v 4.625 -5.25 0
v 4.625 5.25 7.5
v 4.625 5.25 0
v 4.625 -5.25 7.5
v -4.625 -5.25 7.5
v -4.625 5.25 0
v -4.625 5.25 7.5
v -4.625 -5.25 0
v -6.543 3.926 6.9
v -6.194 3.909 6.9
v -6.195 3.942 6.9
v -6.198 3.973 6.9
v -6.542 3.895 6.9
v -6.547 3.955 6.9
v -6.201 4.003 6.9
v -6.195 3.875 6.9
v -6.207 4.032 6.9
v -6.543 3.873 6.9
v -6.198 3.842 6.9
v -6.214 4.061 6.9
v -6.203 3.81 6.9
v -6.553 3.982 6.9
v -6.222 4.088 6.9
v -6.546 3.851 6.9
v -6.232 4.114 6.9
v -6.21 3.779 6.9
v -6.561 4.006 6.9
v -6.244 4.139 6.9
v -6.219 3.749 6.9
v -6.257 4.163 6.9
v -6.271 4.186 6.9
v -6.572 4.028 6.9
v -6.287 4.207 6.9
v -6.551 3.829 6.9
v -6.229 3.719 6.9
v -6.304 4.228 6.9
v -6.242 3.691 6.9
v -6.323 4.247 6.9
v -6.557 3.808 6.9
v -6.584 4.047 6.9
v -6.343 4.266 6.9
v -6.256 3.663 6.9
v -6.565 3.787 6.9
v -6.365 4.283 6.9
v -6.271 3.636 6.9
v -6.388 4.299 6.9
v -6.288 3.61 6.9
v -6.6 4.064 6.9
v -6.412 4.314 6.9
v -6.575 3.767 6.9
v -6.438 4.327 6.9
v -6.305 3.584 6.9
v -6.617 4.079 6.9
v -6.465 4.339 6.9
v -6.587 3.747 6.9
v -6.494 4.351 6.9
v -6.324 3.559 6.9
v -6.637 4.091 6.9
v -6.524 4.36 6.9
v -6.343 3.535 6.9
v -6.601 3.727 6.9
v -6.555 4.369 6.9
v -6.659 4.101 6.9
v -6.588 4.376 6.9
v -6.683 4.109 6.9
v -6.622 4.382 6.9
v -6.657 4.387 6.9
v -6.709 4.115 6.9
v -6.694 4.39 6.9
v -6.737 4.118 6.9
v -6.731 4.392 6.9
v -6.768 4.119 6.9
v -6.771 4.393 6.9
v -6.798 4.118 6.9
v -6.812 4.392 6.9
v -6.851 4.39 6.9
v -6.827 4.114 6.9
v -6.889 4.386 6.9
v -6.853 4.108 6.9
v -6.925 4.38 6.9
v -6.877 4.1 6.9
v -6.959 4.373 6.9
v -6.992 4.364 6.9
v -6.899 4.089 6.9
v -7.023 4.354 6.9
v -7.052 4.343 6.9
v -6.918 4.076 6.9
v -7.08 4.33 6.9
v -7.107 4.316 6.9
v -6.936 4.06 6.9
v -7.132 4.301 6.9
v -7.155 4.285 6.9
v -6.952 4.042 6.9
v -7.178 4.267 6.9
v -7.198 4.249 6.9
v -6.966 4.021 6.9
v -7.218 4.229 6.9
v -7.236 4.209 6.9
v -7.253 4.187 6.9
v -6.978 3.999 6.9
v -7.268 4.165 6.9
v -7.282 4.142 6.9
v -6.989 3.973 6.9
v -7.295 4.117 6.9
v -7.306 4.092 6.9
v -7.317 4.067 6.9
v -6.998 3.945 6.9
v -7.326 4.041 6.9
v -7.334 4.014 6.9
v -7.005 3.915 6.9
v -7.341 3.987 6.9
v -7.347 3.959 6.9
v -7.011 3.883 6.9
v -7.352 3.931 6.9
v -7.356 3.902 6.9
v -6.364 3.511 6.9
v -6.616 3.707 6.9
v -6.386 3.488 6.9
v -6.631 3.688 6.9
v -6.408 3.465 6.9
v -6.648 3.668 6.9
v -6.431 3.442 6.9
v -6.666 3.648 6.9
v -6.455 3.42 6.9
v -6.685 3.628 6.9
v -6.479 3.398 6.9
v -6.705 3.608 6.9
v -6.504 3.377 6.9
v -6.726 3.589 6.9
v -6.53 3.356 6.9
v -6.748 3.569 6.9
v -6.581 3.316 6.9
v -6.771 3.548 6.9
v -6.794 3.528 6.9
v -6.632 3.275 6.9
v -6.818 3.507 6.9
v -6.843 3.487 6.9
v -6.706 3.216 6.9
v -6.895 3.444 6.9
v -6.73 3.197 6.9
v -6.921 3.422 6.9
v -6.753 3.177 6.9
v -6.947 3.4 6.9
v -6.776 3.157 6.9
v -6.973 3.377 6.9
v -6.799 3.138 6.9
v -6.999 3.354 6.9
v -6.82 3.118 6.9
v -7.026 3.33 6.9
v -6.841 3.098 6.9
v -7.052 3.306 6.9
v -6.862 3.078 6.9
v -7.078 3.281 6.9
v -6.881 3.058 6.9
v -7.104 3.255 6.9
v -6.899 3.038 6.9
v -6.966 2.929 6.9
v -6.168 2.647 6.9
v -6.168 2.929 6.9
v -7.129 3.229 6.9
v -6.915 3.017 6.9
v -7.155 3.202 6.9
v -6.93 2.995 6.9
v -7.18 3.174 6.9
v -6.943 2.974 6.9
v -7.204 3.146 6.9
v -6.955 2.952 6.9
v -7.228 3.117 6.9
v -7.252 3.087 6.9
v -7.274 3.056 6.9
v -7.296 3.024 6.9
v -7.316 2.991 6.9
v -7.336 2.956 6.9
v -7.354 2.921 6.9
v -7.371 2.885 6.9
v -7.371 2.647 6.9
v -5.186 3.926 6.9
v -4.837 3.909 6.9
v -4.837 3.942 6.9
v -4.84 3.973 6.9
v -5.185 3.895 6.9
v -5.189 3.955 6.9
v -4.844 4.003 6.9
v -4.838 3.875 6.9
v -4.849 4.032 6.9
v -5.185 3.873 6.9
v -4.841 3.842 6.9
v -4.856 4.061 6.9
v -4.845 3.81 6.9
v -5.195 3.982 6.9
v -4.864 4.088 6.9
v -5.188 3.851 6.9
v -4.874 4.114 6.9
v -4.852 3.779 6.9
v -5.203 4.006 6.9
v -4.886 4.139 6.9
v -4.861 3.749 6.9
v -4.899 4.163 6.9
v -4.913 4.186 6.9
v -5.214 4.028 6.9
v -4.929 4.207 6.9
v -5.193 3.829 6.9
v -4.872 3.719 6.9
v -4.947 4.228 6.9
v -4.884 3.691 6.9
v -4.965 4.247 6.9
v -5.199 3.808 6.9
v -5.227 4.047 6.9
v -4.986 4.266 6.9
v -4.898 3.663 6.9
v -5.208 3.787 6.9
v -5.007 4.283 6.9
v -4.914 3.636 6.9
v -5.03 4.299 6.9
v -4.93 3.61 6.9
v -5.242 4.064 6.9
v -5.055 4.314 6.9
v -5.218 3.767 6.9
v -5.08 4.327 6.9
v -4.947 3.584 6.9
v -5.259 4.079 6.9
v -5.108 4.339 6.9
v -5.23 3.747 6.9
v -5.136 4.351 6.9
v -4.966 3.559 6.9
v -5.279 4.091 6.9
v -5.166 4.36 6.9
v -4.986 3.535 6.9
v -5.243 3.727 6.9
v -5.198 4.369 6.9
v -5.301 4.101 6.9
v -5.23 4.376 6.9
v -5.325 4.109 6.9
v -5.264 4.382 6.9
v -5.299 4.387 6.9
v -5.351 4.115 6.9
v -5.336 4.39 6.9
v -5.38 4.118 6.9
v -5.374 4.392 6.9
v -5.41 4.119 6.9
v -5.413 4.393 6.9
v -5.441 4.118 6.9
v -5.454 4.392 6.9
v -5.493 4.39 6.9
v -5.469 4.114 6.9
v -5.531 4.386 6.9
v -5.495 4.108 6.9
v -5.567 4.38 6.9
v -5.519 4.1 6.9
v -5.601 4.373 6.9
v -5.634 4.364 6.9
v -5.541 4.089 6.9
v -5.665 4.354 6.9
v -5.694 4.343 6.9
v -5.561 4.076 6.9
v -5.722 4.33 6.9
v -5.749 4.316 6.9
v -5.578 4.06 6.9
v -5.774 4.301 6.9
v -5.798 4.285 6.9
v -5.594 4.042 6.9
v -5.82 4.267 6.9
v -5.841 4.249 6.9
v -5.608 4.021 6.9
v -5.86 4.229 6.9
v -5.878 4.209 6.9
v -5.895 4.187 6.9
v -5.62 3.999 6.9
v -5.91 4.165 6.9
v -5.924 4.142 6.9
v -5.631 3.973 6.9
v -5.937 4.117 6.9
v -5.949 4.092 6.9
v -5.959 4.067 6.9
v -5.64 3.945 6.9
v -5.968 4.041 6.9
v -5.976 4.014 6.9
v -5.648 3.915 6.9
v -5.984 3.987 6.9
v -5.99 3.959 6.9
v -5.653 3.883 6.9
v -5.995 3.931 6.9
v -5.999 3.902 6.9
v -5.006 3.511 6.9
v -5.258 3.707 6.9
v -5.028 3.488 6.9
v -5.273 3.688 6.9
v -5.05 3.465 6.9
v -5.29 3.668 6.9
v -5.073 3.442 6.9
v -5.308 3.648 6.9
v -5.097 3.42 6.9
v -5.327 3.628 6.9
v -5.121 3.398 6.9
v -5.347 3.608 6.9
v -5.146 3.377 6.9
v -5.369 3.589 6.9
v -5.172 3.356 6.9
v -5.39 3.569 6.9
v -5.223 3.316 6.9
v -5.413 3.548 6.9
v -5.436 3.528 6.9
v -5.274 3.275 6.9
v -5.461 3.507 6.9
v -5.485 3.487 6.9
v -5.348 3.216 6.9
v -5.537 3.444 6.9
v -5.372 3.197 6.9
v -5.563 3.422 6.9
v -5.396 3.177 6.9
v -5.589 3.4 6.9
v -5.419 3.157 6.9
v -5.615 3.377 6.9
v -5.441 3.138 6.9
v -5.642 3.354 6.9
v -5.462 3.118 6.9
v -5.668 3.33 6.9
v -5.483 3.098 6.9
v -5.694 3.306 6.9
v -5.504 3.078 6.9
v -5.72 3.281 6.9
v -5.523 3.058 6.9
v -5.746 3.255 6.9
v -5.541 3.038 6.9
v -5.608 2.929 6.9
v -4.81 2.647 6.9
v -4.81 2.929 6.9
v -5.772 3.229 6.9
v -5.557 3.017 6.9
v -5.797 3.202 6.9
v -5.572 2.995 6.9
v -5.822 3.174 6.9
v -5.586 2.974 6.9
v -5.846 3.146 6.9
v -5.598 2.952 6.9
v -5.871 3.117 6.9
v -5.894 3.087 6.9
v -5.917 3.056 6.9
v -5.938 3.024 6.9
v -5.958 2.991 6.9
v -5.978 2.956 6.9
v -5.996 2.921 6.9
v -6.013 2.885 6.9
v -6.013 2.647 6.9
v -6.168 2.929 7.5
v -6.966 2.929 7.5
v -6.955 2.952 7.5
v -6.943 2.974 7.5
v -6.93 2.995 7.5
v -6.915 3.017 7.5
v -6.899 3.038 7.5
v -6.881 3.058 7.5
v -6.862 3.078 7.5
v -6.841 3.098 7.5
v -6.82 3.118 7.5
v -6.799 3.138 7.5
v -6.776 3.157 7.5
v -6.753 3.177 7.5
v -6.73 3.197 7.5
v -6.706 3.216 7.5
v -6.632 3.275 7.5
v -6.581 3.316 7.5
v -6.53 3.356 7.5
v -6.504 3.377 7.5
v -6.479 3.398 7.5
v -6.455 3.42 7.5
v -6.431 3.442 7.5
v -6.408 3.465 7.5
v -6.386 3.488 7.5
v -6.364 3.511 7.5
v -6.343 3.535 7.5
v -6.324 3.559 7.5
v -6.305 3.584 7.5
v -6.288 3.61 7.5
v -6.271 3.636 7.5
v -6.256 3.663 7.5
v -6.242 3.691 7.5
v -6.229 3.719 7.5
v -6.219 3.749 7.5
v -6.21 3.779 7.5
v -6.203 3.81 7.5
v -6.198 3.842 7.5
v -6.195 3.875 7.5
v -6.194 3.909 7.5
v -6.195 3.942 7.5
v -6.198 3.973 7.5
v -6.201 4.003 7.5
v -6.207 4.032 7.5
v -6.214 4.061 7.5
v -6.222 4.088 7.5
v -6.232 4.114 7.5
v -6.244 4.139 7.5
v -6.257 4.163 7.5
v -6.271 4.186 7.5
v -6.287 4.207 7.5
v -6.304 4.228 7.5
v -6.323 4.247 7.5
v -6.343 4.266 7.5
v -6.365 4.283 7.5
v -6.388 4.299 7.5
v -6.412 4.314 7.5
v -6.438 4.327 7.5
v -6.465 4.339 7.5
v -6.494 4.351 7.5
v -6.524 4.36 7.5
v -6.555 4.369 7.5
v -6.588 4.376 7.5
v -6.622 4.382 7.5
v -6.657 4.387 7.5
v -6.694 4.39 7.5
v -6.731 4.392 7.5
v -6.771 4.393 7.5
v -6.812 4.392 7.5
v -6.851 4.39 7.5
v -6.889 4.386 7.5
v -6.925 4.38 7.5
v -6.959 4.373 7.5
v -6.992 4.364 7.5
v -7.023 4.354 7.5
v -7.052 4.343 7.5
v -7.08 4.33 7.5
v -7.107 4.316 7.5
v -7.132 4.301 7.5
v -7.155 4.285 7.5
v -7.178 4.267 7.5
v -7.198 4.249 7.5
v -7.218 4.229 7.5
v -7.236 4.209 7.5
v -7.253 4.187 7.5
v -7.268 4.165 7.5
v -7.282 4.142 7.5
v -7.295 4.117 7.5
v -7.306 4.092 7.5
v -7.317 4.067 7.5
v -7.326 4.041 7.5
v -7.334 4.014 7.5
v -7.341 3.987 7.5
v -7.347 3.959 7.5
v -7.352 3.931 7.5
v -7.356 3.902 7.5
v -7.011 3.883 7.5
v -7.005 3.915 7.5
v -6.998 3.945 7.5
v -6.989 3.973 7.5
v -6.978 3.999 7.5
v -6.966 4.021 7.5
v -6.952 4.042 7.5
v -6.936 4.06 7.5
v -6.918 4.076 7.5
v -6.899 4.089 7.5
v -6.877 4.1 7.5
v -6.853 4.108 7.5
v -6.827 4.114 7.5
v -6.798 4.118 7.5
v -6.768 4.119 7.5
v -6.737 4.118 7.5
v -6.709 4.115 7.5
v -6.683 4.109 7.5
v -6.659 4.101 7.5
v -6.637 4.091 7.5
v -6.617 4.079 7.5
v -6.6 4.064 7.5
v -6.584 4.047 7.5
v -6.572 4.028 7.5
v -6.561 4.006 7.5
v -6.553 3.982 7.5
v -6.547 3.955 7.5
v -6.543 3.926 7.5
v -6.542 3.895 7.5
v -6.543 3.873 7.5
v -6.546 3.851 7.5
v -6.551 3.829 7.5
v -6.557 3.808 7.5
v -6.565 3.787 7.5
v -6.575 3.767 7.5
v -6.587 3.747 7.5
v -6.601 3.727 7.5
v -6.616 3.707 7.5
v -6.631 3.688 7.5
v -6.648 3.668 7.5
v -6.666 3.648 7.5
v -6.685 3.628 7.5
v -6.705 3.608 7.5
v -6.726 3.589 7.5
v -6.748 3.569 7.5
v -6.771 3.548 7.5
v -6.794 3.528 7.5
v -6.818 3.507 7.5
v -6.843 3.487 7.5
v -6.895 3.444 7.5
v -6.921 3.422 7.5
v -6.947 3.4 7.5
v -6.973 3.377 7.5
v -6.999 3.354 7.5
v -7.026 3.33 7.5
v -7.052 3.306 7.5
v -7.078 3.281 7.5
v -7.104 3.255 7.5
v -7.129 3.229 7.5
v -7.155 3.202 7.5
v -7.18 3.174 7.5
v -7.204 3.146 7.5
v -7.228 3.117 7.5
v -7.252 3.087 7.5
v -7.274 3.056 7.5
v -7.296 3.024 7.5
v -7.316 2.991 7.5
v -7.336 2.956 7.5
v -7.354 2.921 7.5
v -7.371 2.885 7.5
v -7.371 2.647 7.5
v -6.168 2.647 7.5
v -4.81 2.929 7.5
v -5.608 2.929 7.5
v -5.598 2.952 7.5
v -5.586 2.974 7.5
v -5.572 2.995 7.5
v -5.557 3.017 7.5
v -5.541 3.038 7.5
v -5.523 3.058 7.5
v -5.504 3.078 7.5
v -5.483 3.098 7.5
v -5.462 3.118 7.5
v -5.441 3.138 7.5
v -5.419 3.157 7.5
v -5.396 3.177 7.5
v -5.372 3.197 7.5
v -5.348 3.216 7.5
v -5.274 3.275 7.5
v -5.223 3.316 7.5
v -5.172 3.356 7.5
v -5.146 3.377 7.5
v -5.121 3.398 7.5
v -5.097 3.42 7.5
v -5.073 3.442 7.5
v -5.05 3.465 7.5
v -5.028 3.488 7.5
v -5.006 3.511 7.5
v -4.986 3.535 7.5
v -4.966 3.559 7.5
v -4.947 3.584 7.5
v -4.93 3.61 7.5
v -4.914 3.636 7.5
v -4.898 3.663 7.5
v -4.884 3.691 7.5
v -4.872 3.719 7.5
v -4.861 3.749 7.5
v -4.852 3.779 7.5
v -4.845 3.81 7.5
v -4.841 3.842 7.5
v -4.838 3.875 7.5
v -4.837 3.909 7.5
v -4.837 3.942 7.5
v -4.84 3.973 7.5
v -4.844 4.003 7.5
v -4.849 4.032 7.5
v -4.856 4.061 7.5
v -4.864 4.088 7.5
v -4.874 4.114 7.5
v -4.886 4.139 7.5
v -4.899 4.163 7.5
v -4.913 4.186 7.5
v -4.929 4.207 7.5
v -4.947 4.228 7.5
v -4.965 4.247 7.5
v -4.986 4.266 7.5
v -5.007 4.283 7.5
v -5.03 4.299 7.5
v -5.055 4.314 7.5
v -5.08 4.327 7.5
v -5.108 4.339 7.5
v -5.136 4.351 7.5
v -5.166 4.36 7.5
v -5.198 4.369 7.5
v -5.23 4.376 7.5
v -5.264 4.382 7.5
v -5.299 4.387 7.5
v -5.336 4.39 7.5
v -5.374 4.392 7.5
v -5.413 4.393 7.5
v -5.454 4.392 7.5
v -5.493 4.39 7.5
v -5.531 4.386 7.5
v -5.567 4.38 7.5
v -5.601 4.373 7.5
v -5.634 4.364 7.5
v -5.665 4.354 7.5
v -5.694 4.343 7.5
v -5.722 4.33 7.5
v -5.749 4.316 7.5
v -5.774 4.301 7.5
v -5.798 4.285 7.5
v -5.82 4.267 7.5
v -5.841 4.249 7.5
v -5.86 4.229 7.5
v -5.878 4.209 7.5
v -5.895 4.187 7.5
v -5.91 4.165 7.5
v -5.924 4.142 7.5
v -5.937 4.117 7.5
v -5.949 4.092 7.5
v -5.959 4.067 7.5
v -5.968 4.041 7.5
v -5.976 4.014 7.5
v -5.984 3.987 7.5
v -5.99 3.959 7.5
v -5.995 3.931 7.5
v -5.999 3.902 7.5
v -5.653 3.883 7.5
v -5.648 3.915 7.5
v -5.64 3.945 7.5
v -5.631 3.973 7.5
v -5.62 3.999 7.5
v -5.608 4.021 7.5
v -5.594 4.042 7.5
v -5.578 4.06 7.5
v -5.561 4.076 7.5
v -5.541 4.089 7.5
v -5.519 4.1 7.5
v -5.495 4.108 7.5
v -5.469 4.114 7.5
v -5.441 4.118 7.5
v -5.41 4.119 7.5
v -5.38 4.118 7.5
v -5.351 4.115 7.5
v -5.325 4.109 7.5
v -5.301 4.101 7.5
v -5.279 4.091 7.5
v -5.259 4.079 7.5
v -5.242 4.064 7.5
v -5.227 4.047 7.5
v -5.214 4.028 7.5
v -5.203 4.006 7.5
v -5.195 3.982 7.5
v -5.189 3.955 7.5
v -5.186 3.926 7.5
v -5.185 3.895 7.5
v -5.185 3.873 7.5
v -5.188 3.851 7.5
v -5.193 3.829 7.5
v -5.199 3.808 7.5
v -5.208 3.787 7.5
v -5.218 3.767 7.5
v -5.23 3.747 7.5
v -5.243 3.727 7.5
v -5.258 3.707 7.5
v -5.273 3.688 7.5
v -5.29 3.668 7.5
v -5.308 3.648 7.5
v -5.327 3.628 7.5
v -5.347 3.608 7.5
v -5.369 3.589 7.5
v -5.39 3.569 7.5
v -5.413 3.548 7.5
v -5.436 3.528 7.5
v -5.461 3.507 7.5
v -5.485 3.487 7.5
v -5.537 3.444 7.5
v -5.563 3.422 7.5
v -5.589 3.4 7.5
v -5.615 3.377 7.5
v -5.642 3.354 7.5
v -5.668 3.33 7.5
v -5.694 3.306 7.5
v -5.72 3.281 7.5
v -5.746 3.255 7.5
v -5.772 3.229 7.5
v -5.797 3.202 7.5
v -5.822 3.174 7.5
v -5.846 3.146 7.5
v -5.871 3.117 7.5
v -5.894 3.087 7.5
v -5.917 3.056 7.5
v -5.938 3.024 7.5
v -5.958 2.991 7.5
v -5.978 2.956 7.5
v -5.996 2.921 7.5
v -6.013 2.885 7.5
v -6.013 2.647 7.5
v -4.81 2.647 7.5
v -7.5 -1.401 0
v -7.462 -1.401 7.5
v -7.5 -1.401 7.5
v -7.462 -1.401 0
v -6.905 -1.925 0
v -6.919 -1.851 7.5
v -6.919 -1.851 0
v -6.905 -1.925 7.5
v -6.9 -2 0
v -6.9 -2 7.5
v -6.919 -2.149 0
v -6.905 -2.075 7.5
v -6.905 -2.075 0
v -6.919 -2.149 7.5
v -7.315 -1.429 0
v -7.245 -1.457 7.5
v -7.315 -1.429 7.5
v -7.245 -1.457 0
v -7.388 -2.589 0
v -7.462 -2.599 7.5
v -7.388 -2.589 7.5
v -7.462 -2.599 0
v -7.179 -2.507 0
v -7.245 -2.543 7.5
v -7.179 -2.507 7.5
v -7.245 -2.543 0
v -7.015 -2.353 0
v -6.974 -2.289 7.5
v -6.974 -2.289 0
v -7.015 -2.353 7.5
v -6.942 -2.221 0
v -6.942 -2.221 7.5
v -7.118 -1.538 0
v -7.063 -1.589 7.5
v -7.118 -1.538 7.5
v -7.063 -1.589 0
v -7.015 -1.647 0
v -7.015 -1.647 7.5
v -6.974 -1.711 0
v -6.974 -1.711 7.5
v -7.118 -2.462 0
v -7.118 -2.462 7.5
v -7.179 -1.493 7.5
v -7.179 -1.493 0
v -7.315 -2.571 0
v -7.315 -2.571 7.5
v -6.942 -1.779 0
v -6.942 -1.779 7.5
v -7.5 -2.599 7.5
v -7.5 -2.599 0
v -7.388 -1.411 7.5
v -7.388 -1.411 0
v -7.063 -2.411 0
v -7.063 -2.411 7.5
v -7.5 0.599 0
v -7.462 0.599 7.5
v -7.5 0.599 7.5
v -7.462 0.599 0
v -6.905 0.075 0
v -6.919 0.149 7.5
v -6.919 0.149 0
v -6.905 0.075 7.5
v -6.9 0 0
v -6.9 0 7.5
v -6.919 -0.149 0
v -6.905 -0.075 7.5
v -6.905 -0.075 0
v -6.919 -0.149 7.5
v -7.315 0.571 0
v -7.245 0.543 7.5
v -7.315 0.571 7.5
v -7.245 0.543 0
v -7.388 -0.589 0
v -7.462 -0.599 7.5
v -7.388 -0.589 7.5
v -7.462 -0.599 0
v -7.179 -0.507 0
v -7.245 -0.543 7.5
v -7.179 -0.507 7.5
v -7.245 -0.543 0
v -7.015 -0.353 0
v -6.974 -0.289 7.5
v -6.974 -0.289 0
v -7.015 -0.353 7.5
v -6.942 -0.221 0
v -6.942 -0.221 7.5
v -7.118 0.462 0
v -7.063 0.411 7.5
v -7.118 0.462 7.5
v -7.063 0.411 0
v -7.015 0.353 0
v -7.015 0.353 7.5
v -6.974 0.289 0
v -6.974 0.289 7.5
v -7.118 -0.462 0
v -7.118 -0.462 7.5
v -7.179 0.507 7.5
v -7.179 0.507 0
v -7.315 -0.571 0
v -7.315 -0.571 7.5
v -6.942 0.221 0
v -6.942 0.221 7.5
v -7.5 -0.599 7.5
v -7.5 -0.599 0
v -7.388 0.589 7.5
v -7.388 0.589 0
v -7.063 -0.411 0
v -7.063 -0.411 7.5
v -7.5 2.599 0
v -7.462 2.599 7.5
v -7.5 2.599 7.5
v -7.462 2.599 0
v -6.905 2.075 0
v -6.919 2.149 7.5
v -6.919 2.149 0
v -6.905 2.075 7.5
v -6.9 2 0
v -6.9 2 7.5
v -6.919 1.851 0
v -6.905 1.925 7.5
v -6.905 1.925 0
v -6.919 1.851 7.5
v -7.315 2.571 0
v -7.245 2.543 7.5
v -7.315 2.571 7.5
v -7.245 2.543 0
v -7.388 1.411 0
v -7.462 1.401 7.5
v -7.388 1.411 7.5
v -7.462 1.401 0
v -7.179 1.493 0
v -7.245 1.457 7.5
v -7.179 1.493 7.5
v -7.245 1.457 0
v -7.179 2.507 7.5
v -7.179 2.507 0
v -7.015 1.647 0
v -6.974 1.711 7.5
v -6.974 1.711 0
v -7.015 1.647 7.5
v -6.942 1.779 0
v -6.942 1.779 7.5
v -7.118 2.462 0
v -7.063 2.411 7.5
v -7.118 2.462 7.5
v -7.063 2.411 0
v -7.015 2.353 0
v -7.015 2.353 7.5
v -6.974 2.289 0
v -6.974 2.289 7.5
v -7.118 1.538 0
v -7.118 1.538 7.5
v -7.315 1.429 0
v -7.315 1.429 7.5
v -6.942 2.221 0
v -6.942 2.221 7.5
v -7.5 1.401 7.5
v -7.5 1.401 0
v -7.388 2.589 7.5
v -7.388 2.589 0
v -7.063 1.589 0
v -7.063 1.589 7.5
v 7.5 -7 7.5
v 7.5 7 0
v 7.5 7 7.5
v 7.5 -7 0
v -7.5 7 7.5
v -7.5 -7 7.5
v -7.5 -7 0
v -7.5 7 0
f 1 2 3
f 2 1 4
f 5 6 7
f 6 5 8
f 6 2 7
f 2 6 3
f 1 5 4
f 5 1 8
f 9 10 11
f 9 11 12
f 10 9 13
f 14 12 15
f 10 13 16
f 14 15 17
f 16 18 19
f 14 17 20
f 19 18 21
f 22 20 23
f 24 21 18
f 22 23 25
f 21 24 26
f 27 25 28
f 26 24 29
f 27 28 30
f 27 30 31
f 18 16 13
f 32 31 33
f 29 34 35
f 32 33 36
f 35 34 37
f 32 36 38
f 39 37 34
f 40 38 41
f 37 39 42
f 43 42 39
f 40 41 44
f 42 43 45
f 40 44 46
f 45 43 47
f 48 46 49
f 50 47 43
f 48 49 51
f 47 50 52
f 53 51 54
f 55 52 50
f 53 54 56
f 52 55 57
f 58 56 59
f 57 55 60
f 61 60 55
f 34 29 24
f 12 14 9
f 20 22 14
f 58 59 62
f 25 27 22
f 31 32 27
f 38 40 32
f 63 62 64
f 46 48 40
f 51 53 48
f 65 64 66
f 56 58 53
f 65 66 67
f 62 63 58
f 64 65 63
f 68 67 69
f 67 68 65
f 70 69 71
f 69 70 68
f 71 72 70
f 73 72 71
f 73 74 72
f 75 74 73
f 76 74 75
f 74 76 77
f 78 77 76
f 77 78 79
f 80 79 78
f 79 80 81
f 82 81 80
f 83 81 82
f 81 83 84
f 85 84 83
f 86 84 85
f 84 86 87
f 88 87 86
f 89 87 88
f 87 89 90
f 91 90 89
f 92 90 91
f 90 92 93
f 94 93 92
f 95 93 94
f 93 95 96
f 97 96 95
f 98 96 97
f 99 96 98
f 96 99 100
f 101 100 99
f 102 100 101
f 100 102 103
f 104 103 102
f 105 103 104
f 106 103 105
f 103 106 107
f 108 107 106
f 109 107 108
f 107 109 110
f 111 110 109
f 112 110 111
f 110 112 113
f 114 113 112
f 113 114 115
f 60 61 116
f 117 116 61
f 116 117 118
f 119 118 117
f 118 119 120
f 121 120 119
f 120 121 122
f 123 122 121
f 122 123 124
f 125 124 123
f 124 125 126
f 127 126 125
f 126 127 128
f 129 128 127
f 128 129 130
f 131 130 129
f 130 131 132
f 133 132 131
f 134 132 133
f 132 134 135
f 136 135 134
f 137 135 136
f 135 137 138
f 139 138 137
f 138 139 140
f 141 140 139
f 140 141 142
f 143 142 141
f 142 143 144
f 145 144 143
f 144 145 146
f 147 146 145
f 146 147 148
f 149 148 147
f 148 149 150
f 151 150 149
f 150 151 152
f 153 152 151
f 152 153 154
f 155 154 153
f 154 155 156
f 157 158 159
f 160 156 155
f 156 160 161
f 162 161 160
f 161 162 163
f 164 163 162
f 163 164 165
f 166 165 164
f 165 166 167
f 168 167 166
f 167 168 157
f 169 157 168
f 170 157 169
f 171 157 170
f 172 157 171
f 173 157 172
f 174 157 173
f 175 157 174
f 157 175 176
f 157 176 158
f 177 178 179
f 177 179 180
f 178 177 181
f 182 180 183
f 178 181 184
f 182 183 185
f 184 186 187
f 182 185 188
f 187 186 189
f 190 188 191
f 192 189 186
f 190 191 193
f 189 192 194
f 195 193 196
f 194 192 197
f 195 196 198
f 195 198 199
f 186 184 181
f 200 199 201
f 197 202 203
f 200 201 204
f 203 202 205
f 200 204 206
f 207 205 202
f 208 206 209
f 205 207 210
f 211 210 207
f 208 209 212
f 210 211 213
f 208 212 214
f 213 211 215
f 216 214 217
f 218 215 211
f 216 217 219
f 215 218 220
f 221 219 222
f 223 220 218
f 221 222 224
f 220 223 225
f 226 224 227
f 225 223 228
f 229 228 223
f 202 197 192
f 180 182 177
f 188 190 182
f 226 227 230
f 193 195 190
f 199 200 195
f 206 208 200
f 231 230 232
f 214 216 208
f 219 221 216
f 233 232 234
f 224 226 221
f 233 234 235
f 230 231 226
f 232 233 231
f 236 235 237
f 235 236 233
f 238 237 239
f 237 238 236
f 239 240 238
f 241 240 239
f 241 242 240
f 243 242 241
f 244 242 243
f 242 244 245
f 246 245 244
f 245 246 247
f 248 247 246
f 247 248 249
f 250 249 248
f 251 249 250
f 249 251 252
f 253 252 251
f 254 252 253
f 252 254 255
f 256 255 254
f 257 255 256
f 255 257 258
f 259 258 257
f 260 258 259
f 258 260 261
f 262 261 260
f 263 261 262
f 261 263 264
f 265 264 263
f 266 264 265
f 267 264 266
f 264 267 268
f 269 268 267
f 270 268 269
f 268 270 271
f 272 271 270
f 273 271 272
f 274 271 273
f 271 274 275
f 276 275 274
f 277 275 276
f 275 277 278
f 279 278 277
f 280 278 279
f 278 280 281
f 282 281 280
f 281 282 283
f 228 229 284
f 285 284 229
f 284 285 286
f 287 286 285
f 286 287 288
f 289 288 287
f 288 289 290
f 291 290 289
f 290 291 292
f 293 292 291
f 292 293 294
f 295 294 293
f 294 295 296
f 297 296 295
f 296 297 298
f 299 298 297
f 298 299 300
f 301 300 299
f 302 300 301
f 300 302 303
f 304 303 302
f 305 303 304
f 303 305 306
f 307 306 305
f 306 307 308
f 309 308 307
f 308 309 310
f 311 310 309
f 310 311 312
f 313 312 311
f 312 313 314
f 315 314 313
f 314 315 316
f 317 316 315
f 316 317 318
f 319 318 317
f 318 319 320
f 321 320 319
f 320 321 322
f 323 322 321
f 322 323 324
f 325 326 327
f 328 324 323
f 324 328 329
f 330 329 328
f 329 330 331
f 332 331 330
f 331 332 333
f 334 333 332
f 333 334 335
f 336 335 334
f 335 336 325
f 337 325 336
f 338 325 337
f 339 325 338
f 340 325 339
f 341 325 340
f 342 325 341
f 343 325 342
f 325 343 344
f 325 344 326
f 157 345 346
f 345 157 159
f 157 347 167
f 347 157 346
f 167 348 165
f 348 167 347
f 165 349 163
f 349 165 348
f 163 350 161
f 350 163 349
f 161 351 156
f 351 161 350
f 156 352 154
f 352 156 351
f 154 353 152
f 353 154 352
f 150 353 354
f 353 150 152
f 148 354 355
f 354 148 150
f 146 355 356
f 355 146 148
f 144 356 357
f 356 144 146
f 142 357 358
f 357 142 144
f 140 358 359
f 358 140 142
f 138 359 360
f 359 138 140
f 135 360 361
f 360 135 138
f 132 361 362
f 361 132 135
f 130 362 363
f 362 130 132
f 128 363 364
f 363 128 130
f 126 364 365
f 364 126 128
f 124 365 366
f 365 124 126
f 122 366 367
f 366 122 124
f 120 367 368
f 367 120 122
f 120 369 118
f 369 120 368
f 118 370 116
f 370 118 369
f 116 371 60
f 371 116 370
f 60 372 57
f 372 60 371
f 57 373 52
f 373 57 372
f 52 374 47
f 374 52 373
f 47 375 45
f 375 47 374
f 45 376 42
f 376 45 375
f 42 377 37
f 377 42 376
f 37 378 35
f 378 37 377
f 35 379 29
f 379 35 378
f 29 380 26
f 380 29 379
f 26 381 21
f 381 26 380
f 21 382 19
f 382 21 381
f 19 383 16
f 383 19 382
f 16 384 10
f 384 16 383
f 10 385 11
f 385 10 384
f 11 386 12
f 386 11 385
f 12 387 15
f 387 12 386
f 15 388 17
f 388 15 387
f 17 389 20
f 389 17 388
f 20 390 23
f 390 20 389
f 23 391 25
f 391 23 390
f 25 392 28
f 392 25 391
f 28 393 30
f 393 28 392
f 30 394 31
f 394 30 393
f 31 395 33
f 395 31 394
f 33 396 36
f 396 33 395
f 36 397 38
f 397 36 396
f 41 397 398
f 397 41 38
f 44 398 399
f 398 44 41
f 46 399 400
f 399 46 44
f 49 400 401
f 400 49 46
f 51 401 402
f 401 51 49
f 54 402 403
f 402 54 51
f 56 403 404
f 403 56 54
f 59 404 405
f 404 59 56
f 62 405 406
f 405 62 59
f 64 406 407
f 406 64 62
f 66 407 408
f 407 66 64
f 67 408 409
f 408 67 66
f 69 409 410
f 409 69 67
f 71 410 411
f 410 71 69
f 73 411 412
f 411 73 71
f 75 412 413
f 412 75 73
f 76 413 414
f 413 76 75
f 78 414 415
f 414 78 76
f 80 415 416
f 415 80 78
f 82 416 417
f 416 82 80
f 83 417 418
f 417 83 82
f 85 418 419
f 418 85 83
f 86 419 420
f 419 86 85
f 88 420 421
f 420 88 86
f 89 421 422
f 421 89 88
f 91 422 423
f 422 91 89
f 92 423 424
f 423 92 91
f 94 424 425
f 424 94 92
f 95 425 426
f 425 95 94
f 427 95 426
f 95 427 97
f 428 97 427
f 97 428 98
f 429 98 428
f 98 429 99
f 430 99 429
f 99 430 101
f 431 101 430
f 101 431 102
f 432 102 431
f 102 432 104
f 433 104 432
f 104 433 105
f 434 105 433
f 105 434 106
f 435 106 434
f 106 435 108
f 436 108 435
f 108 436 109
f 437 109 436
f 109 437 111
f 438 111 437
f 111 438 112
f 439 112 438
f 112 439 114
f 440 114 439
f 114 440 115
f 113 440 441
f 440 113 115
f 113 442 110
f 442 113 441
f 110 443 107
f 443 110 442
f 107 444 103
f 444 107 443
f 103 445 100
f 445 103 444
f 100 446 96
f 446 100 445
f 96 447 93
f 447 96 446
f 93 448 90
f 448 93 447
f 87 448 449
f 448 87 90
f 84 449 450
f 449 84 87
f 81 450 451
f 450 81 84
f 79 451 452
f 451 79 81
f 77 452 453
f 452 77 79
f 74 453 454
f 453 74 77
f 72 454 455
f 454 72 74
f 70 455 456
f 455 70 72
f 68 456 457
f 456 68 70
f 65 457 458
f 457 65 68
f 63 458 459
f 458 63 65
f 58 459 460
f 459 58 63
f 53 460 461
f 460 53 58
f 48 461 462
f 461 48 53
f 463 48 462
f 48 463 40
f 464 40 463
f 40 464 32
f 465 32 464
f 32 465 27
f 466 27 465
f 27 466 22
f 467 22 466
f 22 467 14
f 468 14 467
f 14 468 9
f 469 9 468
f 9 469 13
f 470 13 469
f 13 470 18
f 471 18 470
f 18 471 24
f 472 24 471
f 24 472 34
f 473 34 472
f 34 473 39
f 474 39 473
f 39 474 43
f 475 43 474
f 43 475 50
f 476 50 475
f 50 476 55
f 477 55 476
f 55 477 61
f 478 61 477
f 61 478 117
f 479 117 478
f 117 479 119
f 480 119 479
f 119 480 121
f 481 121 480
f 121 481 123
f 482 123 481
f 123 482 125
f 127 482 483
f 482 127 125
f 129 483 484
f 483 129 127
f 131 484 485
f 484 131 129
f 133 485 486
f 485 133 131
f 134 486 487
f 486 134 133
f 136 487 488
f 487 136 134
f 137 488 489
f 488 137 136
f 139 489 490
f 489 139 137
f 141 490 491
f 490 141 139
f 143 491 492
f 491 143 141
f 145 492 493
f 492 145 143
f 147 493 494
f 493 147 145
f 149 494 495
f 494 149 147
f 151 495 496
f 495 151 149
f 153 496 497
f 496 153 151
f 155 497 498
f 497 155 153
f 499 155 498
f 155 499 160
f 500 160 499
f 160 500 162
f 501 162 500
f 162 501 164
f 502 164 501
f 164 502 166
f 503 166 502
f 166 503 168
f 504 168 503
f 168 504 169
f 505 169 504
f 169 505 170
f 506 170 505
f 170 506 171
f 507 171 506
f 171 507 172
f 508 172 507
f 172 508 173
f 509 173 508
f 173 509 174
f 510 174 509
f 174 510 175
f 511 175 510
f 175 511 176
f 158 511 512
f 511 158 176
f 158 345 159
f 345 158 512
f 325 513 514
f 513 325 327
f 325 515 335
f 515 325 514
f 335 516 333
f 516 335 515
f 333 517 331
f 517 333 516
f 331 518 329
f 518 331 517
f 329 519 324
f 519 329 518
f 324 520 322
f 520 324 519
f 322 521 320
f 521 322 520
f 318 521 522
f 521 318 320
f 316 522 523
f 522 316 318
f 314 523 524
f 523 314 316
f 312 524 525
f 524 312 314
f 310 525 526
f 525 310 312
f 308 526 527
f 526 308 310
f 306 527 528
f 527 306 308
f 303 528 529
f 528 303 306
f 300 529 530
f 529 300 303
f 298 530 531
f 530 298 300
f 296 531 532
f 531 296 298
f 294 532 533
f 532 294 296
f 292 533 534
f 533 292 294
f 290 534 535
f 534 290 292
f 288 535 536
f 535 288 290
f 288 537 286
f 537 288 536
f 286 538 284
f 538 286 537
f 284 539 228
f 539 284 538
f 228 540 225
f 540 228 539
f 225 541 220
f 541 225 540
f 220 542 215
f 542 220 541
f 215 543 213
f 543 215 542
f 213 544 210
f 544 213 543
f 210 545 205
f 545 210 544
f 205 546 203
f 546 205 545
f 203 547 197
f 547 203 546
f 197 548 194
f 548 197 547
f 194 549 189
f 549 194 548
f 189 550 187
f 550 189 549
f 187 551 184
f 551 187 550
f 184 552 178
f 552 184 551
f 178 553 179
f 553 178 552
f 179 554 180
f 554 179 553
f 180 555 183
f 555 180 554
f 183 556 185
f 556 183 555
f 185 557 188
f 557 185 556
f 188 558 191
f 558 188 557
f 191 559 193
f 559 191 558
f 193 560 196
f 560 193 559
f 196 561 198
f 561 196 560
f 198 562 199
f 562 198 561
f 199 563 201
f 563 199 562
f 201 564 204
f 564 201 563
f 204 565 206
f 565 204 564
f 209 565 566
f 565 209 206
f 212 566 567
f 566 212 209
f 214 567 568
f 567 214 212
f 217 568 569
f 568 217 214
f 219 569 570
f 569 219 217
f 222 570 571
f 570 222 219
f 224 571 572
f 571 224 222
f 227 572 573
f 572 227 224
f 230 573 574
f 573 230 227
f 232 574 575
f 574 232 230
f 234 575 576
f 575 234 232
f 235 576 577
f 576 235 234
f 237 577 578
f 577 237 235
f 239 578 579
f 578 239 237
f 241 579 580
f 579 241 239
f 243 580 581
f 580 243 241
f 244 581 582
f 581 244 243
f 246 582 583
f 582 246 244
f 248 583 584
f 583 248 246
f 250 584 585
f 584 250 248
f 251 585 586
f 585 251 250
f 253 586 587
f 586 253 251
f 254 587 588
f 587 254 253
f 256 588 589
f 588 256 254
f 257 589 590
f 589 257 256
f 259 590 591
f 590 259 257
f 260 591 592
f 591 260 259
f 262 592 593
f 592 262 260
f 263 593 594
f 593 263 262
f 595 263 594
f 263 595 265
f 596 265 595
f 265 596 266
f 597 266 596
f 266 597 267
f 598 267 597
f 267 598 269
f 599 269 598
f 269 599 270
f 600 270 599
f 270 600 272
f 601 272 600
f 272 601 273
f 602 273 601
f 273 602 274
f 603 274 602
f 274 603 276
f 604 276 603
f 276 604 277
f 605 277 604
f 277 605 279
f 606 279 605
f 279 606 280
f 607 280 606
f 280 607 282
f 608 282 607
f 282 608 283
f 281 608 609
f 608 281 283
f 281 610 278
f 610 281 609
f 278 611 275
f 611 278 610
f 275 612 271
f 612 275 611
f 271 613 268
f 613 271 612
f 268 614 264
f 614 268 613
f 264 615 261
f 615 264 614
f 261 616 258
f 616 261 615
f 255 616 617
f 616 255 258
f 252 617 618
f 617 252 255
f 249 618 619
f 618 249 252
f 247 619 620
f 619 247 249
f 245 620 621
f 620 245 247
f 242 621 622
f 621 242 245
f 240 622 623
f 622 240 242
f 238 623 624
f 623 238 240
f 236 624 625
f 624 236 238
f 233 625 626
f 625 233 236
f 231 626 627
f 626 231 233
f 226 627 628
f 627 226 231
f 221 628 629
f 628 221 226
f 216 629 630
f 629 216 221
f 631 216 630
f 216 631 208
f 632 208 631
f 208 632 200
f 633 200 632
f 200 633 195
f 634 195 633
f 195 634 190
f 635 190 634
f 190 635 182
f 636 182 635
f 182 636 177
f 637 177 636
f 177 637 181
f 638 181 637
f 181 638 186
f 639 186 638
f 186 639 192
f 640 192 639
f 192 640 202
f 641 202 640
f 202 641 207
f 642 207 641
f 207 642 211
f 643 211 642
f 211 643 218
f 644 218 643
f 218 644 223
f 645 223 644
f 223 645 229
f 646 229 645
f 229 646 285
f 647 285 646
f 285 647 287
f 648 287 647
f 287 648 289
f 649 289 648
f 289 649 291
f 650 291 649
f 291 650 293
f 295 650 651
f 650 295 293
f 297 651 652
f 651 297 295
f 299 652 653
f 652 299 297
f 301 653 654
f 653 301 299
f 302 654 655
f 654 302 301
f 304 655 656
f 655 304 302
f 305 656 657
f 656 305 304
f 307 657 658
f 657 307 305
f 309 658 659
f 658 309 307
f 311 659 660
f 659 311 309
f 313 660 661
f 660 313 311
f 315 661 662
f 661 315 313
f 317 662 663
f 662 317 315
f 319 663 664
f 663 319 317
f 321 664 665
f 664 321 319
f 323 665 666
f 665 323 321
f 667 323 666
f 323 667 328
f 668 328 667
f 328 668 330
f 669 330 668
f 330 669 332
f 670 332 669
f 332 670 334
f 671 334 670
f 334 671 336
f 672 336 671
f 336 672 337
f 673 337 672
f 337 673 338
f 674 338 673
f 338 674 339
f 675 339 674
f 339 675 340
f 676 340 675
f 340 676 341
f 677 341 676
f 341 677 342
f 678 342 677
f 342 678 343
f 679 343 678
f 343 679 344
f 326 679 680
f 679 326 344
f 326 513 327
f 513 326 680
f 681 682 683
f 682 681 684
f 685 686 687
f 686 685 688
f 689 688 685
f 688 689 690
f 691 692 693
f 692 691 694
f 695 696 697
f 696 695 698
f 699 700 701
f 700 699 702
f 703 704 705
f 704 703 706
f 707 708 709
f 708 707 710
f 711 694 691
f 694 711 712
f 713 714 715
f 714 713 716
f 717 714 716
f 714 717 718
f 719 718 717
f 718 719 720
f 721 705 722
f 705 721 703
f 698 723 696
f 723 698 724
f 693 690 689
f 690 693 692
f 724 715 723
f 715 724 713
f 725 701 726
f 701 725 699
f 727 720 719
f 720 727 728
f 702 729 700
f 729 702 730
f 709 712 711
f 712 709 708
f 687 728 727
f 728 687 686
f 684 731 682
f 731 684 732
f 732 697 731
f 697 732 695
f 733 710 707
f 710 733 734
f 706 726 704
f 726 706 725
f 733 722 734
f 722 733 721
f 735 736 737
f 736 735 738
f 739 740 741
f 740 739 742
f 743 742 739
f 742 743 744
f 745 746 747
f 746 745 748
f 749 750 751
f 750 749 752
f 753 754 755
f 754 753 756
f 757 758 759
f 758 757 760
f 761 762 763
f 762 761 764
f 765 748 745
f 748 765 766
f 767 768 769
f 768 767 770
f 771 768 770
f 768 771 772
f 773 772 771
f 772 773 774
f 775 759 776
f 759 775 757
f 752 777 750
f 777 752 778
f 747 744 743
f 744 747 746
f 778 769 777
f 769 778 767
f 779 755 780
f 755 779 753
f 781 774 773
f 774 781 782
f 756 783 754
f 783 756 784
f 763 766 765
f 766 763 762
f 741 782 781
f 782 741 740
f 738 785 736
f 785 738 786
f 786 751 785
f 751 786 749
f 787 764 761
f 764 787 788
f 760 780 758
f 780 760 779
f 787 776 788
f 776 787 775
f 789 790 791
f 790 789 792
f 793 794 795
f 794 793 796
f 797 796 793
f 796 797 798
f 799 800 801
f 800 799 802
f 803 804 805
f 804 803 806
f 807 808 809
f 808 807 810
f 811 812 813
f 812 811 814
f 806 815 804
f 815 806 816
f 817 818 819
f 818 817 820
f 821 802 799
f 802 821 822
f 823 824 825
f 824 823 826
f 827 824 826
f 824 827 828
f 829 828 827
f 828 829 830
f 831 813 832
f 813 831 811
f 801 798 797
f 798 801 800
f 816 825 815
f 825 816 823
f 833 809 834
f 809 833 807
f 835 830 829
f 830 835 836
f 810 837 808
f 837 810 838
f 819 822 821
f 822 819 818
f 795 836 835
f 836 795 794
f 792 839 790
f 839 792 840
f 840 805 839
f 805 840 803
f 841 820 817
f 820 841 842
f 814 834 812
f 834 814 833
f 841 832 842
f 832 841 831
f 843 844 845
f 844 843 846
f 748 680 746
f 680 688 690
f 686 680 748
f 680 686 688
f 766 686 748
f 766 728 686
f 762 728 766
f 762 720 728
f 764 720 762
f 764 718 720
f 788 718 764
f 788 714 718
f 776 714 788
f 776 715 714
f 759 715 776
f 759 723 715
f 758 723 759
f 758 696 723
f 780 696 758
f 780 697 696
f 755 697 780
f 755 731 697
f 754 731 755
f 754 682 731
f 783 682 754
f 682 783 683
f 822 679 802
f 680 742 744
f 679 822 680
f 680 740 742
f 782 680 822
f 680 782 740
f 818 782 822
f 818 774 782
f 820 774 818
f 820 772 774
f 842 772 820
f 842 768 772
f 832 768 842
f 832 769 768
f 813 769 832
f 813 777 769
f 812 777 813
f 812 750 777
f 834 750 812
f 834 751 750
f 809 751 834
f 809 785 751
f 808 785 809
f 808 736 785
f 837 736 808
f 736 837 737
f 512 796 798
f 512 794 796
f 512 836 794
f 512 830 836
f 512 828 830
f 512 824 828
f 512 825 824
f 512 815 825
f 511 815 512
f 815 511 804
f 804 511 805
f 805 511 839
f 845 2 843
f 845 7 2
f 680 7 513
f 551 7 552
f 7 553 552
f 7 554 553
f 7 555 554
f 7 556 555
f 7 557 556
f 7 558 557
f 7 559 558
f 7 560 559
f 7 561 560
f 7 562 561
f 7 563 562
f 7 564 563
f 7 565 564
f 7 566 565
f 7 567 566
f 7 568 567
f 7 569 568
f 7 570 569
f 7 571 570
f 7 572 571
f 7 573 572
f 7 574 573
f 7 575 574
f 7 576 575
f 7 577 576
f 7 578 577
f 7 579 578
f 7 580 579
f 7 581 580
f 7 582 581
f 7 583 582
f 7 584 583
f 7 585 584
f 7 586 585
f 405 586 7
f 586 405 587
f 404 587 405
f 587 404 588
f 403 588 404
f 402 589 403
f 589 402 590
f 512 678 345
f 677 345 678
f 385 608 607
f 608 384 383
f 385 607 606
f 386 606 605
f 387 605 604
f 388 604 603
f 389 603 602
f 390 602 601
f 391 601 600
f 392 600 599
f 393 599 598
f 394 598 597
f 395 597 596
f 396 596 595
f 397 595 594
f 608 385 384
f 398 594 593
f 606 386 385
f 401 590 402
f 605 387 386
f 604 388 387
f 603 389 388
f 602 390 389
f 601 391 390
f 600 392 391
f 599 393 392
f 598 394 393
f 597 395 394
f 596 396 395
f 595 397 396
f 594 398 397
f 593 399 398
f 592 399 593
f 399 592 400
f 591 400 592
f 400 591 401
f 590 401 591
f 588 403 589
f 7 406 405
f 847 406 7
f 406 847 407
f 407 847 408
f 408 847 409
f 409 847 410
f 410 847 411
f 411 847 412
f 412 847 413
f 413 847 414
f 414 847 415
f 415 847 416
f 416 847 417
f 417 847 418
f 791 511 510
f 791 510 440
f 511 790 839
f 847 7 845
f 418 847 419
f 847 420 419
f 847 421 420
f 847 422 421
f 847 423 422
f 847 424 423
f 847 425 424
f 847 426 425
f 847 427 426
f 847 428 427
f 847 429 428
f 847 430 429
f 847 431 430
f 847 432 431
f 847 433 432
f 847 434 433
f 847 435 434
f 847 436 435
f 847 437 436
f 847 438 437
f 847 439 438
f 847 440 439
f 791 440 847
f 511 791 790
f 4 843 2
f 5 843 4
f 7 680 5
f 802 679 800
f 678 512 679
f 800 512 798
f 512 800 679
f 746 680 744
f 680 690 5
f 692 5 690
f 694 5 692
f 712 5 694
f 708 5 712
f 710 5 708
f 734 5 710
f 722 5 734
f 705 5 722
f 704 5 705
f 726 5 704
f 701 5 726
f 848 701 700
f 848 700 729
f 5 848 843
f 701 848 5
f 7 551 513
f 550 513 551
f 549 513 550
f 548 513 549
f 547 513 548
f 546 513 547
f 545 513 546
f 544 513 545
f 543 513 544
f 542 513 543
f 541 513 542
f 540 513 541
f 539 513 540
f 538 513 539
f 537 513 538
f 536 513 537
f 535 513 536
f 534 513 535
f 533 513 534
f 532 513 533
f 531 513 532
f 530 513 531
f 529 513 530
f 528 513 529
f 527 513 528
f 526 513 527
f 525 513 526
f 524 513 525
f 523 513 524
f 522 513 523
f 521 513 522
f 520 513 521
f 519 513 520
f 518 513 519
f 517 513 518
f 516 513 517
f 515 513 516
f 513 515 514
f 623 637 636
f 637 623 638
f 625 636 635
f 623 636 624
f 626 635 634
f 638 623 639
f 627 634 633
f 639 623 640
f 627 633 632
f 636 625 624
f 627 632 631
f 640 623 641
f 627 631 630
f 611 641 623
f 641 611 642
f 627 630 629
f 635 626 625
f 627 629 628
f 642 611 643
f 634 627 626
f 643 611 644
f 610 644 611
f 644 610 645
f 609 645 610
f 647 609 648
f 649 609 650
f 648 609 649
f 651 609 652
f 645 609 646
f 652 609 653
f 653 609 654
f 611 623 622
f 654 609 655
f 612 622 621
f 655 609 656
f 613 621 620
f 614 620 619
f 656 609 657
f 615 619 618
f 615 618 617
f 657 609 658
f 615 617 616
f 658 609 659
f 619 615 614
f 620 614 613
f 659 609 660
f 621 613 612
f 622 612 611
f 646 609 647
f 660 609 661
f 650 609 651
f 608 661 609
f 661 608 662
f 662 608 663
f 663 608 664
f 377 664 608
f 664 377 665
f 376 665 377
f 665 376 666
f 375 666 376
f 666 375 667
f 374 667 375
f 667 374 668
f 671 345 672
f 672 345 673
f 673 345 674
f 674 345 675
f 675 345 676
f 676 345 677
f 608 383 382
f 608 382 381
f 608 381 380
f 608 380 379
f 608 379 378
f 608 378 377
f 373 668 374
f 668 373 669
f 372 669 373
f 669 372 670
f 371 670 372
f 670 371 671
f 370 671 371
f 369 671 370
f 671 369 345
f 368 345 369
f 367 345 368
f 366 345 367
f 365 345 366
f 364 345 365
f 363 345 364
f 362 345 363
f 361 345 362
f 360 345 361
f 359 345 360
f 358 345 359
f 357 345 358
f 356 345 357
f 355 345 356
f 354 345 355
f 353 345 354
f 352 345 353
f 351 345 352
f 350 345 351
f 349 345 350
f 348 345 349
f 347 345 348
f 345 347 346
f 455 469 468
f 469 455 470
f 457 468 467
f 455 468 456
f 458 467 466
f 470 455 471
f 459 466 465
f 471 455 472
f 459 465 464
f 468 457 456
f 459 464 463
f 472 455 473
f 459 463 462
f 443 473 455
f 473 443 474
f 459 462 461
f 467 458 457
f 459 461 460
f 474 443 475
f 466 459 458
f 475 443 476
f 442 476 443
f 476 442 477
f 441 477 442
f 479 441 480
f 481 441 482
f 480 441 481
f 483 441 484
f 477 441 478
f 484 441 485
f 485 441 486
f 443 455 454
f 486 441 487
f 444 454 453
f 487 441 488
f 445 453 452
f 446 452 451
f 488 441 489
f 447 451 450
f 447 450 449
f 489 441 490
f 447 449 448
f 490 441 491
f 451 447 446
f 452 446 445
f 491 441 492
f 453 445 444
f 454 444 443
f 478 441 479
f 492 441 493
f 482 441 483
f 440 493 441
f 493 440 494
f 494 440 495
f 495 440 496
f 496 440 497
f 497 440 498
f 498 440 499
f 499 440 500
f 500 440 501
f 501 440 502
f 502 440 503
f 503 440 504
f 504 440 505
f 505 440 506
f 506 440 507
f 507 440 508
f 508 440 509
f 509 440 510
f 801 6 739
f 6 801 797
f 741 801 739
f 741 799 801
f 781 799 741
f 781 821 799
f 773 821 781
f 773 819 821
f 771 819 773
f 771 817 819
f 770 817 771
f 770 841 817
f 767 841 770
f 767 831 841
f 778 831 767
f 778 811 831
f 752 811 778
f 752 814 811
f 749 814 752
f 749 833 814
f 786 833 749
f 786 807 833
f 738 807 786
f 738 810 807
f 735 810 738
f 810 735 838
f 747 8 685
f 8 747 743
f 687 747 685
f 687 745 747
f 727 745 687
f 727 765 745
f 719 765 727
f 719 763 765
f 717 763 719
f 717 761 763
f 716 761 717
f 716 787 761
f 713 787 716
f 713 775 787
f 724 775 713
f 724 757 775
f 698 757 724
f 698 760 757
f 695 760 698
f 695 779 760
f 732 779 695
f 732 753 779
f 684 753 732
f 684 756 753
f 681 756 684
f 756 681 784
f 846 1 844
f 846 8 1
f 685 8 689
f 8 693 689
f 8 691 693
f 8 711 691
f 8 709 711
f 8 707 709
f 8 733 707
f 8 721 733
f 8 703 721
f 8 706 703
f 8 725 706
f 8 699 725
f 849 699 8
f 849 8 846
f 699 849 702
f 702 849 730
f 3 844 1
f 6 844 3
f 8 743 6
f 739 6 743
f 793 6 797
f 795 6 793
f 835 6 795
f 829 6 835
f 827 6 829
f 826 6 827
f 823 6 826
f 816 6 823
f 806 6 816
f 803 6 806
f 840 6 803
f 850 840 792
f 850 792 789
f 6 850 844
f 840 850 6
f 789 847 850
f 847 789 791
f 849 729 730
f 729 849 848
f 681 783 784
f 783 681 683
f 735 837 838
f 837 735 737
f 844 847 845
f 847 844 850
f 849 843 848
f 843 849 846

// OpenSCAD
$fn = 50;

difference() {
	union() {
		translate(v = [0, -5, 0]) {
			rotate(a = [0, 0, 0]) {
				difference() {
					union() {
						translate(v = [-7.5, -2.0, 0]) {
							cube(size = [15.0, 14.0, 7.5]);
						}
					}
					union() {
						translate(v = [-4.625, -0.25, -0.1]) {
							cube(size = [9.25, 10.5, 7.7]);
						}
						translate(v = [-6.1, 8.5, 6.9]) {
							linear_extrude(height = 0.7) {
								text(font = "Arial:style=Bold", halign = "center", size = 1.8, text = "22", valign = "center");
							}
						}
						translate(v = [-7.5, 3, -0.1]) {
							cylinder(h = 7.7, r = 0.6);
						}
						translate(v = [-7.5, 5, -0.1]) {
							cylinder(h = 7.7, r = 0.6);
						}
						translate(v = [-7.5, 7, -0.1]) {
							cylinder(h = 7.7, r = 0.6);
						}
					}
				}
			}
		}
	}
	union();
}
